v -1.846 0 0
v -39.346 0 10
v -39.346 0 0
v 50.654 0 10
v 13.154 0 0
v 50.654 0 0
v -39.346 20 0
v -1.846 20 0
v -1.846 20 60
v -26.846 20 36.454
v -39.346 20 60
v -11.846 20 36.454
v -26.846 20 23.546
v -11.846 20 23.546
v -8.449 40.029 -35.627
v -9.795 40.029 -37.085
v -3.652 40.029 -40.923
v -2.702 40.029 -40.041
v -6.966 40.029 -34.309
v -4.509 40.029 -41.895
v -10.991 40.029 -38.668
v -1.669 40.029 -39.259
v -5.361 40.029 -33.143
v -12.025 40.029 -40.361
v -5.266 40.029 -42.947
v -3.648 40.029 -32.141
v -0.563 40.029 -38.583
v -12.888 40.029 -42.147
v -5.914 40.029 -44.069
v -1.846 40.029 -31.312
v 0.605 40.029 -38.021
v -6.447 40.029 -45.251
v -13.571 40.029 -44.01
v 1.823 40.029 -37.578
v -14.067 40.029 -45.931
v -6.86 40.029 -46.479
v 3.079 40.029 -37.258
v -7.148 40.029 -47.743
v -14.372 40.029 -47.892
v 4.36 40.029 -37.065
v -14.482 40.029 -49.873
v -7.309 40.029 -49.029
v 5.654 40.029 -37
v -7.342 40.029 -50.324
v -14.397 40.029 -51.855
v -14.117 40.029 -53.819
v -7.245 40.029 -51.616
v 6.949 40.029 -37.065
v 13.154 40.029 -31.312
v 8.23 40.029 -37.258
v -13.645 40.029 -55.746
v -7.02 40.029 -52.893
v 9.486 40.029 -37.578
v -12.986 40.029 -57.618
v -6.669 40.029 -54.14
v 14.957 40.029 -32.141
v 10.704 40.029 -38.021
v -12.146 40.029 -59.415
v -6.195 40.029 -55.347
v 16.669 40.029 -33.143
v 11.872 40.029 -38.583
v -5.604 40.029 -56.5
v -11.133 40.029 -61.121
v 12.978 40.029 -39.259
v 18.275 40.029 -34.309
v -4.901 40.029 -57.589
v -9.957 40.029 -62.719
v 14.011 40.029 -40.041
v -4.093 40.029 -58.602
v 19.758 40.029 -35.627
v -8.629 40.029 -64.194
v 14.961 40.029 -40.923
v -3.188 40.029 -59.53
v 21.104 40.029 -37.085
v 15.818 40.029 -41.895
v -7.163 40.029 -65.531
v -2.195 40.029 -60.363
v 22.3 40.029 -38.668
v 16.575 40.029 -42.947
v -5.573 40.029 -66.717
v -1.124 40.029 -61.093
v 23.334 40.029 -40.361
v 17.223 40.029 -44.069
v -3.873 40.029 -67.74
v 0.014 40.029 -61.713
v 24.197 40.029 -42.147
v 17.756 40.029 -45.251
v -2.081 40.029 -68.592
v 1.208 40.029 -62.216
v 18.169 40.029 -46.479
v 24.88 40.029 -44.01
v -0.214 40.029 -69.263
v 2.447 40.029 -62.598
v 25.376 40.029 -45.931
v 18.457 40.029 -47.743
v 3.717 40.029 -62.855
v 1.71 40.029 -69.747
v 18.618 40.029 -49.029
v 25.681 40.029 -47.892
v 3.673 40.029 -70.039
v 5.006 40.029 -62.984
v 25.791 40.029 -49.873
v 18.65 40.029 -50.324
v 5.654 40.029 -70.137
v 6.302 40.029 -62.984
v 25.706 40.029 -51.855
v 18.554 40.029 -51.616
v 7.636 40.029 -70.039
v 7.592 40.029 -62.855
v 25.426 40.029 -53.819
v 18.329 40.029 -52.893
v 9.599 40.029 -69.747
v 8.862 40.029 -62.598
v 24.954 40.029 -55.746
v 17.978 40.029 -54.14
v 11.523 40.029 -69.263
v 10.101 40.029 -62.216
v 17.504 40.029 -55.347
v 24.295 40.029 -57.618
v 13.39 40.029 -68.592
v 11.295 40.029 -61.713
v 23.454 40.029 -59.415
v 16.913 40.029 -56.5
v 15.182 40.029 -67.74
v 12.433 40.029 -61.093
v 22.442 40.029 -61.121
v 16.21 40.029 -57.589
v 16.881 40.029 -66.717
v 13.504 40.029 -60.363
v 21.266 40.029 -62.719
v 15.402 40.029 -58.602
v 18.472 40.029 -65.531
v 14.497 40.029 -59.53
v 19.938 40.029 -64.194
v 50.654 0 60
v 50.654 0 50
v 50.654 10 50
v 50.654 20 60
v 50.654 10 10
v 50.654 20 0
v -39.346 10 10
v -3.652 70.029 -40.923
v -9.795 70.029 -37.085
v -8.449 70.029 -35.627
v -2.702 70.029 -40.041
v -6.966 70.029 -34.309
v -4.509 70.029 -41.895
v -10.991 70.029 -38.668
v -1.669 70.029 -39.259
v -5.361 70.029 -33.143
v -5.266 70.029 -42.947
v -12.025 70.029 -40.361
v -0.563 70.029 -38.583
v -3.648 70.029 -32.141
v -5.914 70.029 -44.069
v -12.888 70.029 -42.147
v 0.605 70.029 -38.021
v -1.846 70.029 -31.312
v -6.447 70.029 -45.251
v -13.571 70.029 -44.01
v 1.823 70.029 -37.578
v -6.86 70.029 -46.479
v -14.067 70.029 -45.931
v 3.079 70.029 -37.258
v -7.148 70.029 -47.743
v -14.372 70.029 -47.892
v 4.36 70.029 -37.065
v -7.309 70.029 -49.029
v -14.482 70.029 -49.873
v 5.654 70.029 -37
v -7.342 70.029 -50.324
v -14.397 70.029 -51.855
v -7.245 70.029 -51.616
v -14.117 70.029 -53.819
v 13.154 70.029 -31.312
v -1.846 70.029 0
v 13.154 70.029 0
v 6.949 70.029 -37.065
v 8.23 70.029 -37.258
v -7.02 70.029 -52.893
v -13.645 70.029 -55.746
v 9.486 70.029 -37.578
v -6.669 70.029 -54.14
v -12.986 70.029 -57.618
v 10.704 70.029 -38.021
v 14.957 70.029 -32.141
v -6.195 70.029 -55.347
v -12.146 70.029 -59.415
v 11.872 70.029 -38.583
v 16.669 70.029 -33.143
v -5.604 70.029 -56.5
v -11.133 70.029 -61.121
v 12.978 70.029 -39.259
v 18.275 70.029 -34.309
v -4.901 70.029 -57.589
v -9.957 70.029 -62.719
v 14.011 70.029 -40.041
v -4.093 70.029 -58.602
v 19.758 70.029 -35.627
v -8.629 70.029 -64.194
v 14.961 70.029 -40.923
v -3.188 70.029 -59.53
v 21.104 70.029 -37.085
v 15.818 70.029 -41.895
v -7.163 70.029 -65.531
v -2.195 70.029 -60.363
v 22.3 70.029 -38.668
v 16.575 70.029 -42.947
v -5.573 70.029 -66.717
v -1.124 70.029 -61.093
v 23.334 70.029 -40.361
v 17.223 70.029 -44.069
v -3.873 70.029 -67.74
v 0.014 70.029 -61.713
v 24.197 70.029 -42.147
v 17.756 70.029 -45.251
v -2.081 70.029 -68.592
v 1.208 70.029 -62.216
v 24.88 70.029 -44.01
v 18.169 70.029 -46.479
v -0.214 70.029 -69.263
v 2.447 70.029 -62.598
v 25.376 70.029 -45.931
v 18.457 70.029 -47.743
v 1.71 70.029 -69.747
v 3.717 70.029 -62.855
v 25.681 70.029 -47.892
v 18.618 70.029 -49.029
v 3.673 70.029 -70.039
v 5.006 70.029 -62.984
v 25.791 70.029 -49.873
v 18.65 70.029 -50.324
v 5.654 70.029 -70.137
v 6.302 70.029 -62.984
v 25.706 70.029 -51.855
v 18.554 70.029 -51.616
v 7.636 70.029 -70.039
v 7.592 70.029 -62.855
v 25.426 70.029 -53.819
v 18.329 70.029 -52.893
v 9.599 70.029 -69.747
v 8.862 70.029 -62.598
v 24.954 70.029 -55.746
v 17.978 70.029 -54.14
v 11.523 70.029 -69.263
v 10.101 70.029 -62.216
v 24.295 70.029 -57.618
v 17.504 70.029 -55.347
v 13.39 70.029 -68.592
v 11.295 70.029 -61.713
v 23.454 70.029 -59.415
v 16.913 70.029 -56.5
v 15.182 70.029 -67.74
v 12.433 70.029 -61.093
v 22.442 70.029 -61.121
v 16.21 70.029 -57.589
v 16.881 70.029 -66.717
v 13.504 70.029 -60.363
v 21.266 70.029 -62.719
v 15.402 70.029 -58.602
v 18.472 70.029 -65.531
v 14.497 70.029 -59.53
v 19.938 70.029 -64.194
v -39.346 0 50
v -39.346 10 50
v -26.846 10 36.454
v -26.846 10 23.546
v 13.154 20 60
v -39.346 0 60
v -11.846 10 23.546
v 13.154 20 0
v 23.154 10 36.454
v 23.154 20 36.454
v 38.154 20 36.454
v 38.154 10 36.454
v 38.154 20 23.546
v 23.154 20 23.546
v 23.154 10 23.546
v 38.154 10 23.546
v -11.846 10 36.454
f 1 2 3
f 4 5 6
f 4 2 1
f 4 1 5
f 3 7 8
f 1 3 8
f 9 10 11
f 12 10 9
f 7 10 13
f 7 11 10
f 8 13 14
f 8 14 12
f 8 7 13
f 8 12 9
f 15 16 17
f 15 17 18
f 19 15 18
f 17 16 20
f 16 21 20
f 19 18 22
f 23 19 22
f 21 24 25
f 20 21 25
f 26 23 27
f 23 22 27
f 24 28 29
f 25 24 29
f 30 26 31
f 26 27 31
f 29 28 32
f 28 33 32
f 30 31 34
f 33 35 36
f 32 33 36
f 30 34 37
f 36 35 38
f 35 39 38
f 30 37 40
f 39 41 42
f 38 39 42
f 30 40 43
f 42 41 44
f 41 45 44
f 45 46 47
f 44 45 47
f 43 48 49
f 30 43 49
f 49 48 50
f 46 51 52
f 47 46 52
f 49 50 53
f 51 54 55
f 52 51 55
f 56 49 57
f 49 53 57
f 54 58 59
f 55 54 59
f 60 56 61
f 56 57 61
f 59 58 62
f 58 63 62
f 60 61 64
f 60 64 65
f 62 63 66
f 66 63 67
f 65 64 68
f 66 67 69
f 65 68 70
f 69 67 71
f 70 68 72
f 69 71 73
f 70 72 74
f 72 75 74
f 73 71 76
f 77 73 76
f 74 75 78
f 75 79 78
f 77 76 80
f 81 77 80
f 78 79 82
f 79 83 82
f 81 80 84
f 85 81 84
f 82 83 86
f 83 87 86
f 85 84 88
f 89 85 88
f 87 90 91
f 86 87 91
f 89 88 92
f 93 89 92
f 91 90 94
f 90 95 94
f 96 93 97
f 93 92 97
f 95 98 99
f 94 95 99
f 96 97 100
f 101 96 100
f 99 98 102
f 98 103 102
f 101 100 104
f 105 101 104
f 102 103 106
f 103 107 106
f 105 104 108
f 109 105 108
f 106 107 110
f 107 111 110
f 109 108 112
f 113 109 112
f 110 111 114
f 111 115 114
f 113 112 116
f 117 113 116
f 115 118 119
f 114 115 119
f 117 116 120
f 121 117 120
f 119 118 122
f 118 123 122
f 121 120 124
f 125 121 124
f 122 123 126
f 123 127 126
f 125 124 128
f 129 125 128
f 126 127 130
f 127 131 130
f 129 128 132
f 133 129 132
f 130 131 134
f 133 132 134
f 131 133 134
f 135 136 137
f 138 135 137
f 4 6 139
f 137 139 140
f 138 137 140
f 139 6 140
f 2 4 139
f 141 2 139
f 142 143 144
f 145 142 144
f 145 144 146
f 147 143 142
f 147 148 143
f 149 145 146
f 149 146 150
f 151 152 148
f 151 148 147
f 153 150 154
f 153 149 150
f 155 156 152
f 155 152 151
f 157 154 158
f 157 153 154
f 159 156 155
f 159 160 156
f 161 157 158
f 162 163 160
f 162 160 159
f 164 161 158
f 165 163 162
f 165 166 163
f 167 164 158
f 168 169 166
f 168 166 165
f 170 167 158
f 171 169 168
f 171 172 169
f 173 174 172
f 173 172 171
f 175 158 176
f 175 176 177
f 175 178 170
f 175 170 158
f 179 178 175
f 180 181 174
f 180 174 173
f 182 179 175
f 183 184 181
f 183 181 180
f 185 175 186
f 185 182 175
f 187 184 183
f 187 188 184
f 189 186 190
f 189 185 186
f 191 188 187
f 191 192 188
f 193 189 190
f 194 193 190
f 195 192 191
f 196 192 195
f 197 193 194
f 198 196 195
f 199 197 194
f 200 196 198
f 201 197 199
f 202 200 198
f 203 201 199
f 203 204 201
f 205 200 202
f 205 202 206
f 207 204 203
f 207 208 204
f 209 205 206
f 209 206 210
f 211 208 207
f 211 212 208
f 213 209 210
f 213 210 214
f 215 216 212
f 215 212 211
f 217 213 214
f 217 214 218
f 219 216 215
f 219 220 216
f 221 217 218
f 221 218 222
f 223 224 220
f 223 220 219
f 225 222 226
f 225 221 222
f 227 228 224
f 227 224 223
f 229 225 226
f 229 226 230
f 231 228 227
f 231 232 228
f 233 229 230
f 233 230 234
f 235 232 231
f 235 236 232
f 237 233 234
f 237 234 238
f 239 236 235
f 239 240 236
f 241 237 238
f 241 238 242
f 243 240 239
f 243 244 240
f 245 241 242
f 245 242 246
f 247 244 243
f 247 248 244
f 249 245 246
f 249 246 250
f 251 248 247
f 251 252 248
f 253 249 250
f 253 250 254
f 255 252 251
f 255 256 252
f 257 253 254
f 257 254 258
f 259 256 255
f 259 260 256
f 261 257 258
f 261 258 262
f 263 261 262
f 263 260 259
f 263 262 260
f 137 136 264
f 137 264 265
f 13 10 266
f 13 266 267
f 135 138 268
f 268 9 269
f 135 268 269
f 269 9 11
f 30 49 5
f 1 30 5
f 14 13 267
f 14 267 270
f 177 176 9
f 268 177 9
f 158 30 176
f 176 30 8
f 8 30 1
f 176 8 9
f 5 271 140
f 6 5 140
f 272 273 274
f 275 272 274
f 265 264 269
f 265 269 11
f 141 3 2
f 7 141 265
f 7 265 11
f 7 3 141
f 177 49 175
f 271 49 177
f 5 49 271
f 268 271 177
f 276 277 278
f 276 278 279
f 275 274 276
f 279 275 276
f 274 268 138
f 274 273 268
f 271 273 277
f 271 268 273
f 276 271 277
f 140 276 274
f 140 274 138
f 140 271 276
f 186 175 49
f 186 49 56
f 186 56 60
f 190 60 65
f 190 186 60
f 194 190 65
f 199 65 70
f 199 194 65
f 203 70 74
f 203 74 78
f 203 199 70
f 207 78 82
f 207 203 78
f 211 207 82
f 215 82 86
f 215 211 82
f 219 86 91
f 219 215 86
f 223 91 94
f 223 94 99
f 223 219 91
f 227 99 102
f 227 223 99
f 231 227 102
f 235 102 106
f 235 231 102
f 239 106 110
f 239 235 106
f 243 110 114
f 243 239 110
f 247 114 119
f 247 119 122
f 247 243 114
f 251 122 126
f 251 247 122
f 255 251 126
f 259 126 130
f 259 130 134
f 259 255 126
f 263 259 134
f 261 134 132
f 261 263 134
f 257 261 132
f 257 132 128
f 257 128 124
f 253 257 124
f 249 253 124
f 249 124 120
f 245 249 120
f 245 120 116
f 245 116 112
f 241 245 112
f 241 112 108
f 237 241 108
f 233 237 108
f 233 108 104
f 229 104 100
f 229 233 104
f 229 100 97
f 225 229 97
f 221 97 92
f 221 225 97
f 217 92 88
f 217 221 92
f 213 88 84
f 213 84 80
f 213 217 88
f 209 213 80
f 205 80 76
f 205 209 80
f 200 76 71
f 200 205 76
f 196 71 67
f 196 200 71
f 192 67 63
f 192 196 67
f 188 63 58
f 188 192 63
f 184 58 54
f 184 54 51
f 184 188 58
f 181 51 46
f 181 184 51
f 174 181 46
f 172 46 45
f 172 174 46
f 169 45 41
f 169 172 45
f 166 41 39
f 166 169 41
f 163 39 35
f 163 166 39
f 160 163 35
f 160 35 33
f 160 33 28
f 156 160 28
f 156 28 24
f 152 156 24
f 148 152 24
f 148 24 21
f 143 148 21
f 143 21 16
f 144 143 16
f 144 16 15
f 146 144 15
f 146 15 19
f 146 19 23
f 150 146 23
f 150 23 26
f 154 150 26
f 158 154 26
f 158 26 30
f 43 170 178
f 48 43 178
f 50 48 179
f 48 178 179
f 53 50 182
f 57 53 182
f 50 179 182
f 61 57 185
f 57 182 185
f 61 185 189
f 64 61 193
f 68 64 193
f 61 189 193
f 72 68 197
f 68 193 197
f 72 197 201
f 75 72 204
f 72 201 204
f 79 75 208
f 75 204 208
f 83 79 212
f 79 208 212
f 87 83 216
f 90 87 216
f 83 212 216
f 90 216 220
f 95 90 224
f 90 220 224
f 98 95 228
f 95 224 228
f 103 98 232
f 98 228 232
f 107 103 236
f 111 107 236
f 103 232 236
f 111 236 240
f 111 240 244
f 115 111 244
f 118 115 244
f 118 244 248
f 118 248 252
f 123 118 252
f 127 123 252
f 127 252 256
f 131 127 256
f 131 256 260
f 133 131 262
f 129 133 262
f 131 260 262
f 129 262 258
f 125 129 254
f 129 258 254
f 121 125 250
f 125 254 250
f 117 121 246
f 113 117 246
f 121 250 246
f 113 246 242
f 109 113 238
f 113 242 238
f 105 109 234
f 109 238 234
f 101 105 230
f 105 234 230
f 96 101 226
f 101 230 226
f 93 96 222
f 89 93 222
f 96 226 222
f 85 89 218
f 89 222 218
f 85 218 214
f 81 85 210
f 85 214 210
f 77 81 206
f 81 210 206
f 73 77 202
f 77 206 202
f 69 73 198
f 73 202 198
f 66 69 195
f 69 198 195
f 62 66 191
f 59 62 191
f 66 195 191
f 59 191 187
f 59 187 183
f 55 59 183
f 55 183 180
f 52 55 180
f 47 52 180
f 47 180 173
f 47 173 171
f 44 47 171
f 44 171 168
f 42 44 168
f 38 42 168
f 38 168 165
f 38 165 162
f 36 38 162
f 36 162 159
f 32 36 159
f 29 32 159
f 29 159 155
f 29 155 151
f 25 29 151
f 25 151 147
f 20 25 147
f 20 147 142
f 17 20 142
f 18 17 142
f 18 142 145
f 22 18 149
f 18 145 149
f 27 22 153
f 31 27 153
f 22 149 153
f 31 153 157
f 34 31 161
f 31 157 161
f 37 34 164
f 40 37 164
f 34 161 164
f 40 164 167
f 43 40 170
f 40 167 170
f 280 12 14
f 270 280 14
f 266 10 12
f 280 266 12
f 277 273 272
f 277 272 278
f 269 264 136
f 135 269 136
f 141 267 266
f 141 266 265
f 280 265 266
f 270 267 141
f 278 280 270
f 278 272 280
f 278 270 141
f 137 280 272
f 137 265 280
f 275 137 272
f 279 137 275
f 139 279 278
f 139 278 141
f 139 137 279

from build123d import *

# Parameters (mm, degrees)
SKETCH1_W                = 90
SKETCH1_H                = 20
BOSS_EXTRUDE1_DEPTH      = 60
SKETCH2_W                = 40
SKETCH2_H                = 10
CUT_EXTRUDE2_DEPTH       = 90
SKETCH3_W                = 15
SKETCH3_H                = 12.908253666
CUT_EXTRUDE4_DEPTH       = 30
BOSS_EXTRUDE7_DEPTH      = 10
BOSS_EXTRUDE7_DEPTH_BACK = 60
SKETCH4_W                = 15
SKETCH4_H                = 50.029295458
CUT_EXTRUDE7_DEPTH       = 15
SKETCH15_R               = 13
BOSS_EXTRUDE9_DEPTH      = 30
SKETCH28_W               = 15
SKETCH28_H               = 31.312087749
BOSS_EXTRUDE12_DEPTH     = 47
CUT_EXTRUDE10_DEPTH      = 15


with BuildPart() as part:
    # Sketch1 → Boss-Extrude1 (new body)
    with BuildSketch(Plane.XY):
        with Locations((5.654450262, 10)):
            Rectangle(SKETCH1_W, SKETCH1_H)
    extrude(amount=BOSS_EXTRUDE1_DEPTH)

    # Sketch2 → Cut-Extrude2 (cut)
    with BuildSketch(Plane(origin=(50.654450262, 0, 0), x_dir=(0, 0, -1), z_dir=(1, 0, 0))):
        with Locations((-30, 5)):
            Rectangle(SKETCH2_W, SKETCH2_H)
    extrude(amount=-CUT_EXTRUDE2_DEPTH, mode=Mode.SUBTRACT)

    # Sketch3 → Cut-Extrude4 (cut)
    with BuildSketch(Plane(origin=(0, 20, 0), x_dir=(1, 0, 0), z_dir=(0, 1, 0))):
        with Locations((-19.345549738, -30)):
            Rectangle(SKETCH3_W, SKETCH3_H)
        with Locations((30.654450262, -30)):
            Rectangle(SKETCH3_W, SKETCH3_H)
    extrude(amount=-CUT_EXTRUDE4_DEPTH, mode=Mode.SUBTRACT)

    # Sketch4 → Boss-Extrude7 (add, two sides: drawn at the far end of the back side and taken through both)
    with BuildSketch(Plane(origin=(0, 0, 0), x_dir=(-1, 0, 0), z_dir=(0, 0, -1)).offset(-BOSS_EXTRUDE7_DEPTH_BACK)):
        with Locations((-5.654450262, 45.014647729)):
            Rectangle(SKETCH4_W, SKETCH4_H)
    extrude(amount=BOSS_EXTRUDE7_DEPTH + BOSS_EXTRUDE7_DEPTH_BACK)

    # Sketch13 → Cut-Extrude7 (cut)
    with BuildSketch(Plane.ZY.offset(1.845549738)):
        Polygon((60, 20), (60, 70.029295458), (0, 70.029295458), align=None)
    extrude(amount=-CUT_EXTRUDE7_DEPTH, mode=Mode.SUBTRACT)

    # Sketch15 → Boss-Extrude9 (add)
    with BuildSketch(Plane(origin=(0, 70.029295458, 0), x_dir=(1, 0, 0), z_dir=(0, 1, 0))):
        with BuildLine():
            Line((-1.845549738, 10), (13.154450262, 10))
            Line((13.154450262, 10), (13.154450262, 31.312087749))
            ThreePointArc((13.154450262, 31.312087749), (5.654450262, 70.136734201), (-1.845549738, 31.312087749))
            Line((-1.845549738, 31.312087749), (-1.845549738, 10))
        make_face()
        with Locations(Location((5.654450262, 50, 0), (0, 0, 270))):
            Circle(SKETCH15_R, mode=Mode.SUBTRACT)
    extrude(amount=-BOSS_EXTRUDE9_DEPTH)

    # Sketch28 → Boss-Extrude12 (add)
    with BuildSketch(Plane.XZ):
        with Locations((5.654450262, -15.656043875)):
            Rectangle(SKETCH28_W, SKETCH28_H)
    extrude(amount=-BOSS_EXTRUDE12_DEPTH)

    # Sketch29 → Cut-Extrude10 (cut)
    with BuildSketch(Plane(origin=(13.154450262, 0, 0), x_dir=(0, 0, -1), z_dir=(1, 0, 0))):
        Polygon((31.312087749, 40.029295458), (0, 0), (31.312087749, 0), align=None)
    extrude(amount=-CUT_EXTRUDE10_DEPTH, mode=Mode.SUBTRACT)


solid = part.part
